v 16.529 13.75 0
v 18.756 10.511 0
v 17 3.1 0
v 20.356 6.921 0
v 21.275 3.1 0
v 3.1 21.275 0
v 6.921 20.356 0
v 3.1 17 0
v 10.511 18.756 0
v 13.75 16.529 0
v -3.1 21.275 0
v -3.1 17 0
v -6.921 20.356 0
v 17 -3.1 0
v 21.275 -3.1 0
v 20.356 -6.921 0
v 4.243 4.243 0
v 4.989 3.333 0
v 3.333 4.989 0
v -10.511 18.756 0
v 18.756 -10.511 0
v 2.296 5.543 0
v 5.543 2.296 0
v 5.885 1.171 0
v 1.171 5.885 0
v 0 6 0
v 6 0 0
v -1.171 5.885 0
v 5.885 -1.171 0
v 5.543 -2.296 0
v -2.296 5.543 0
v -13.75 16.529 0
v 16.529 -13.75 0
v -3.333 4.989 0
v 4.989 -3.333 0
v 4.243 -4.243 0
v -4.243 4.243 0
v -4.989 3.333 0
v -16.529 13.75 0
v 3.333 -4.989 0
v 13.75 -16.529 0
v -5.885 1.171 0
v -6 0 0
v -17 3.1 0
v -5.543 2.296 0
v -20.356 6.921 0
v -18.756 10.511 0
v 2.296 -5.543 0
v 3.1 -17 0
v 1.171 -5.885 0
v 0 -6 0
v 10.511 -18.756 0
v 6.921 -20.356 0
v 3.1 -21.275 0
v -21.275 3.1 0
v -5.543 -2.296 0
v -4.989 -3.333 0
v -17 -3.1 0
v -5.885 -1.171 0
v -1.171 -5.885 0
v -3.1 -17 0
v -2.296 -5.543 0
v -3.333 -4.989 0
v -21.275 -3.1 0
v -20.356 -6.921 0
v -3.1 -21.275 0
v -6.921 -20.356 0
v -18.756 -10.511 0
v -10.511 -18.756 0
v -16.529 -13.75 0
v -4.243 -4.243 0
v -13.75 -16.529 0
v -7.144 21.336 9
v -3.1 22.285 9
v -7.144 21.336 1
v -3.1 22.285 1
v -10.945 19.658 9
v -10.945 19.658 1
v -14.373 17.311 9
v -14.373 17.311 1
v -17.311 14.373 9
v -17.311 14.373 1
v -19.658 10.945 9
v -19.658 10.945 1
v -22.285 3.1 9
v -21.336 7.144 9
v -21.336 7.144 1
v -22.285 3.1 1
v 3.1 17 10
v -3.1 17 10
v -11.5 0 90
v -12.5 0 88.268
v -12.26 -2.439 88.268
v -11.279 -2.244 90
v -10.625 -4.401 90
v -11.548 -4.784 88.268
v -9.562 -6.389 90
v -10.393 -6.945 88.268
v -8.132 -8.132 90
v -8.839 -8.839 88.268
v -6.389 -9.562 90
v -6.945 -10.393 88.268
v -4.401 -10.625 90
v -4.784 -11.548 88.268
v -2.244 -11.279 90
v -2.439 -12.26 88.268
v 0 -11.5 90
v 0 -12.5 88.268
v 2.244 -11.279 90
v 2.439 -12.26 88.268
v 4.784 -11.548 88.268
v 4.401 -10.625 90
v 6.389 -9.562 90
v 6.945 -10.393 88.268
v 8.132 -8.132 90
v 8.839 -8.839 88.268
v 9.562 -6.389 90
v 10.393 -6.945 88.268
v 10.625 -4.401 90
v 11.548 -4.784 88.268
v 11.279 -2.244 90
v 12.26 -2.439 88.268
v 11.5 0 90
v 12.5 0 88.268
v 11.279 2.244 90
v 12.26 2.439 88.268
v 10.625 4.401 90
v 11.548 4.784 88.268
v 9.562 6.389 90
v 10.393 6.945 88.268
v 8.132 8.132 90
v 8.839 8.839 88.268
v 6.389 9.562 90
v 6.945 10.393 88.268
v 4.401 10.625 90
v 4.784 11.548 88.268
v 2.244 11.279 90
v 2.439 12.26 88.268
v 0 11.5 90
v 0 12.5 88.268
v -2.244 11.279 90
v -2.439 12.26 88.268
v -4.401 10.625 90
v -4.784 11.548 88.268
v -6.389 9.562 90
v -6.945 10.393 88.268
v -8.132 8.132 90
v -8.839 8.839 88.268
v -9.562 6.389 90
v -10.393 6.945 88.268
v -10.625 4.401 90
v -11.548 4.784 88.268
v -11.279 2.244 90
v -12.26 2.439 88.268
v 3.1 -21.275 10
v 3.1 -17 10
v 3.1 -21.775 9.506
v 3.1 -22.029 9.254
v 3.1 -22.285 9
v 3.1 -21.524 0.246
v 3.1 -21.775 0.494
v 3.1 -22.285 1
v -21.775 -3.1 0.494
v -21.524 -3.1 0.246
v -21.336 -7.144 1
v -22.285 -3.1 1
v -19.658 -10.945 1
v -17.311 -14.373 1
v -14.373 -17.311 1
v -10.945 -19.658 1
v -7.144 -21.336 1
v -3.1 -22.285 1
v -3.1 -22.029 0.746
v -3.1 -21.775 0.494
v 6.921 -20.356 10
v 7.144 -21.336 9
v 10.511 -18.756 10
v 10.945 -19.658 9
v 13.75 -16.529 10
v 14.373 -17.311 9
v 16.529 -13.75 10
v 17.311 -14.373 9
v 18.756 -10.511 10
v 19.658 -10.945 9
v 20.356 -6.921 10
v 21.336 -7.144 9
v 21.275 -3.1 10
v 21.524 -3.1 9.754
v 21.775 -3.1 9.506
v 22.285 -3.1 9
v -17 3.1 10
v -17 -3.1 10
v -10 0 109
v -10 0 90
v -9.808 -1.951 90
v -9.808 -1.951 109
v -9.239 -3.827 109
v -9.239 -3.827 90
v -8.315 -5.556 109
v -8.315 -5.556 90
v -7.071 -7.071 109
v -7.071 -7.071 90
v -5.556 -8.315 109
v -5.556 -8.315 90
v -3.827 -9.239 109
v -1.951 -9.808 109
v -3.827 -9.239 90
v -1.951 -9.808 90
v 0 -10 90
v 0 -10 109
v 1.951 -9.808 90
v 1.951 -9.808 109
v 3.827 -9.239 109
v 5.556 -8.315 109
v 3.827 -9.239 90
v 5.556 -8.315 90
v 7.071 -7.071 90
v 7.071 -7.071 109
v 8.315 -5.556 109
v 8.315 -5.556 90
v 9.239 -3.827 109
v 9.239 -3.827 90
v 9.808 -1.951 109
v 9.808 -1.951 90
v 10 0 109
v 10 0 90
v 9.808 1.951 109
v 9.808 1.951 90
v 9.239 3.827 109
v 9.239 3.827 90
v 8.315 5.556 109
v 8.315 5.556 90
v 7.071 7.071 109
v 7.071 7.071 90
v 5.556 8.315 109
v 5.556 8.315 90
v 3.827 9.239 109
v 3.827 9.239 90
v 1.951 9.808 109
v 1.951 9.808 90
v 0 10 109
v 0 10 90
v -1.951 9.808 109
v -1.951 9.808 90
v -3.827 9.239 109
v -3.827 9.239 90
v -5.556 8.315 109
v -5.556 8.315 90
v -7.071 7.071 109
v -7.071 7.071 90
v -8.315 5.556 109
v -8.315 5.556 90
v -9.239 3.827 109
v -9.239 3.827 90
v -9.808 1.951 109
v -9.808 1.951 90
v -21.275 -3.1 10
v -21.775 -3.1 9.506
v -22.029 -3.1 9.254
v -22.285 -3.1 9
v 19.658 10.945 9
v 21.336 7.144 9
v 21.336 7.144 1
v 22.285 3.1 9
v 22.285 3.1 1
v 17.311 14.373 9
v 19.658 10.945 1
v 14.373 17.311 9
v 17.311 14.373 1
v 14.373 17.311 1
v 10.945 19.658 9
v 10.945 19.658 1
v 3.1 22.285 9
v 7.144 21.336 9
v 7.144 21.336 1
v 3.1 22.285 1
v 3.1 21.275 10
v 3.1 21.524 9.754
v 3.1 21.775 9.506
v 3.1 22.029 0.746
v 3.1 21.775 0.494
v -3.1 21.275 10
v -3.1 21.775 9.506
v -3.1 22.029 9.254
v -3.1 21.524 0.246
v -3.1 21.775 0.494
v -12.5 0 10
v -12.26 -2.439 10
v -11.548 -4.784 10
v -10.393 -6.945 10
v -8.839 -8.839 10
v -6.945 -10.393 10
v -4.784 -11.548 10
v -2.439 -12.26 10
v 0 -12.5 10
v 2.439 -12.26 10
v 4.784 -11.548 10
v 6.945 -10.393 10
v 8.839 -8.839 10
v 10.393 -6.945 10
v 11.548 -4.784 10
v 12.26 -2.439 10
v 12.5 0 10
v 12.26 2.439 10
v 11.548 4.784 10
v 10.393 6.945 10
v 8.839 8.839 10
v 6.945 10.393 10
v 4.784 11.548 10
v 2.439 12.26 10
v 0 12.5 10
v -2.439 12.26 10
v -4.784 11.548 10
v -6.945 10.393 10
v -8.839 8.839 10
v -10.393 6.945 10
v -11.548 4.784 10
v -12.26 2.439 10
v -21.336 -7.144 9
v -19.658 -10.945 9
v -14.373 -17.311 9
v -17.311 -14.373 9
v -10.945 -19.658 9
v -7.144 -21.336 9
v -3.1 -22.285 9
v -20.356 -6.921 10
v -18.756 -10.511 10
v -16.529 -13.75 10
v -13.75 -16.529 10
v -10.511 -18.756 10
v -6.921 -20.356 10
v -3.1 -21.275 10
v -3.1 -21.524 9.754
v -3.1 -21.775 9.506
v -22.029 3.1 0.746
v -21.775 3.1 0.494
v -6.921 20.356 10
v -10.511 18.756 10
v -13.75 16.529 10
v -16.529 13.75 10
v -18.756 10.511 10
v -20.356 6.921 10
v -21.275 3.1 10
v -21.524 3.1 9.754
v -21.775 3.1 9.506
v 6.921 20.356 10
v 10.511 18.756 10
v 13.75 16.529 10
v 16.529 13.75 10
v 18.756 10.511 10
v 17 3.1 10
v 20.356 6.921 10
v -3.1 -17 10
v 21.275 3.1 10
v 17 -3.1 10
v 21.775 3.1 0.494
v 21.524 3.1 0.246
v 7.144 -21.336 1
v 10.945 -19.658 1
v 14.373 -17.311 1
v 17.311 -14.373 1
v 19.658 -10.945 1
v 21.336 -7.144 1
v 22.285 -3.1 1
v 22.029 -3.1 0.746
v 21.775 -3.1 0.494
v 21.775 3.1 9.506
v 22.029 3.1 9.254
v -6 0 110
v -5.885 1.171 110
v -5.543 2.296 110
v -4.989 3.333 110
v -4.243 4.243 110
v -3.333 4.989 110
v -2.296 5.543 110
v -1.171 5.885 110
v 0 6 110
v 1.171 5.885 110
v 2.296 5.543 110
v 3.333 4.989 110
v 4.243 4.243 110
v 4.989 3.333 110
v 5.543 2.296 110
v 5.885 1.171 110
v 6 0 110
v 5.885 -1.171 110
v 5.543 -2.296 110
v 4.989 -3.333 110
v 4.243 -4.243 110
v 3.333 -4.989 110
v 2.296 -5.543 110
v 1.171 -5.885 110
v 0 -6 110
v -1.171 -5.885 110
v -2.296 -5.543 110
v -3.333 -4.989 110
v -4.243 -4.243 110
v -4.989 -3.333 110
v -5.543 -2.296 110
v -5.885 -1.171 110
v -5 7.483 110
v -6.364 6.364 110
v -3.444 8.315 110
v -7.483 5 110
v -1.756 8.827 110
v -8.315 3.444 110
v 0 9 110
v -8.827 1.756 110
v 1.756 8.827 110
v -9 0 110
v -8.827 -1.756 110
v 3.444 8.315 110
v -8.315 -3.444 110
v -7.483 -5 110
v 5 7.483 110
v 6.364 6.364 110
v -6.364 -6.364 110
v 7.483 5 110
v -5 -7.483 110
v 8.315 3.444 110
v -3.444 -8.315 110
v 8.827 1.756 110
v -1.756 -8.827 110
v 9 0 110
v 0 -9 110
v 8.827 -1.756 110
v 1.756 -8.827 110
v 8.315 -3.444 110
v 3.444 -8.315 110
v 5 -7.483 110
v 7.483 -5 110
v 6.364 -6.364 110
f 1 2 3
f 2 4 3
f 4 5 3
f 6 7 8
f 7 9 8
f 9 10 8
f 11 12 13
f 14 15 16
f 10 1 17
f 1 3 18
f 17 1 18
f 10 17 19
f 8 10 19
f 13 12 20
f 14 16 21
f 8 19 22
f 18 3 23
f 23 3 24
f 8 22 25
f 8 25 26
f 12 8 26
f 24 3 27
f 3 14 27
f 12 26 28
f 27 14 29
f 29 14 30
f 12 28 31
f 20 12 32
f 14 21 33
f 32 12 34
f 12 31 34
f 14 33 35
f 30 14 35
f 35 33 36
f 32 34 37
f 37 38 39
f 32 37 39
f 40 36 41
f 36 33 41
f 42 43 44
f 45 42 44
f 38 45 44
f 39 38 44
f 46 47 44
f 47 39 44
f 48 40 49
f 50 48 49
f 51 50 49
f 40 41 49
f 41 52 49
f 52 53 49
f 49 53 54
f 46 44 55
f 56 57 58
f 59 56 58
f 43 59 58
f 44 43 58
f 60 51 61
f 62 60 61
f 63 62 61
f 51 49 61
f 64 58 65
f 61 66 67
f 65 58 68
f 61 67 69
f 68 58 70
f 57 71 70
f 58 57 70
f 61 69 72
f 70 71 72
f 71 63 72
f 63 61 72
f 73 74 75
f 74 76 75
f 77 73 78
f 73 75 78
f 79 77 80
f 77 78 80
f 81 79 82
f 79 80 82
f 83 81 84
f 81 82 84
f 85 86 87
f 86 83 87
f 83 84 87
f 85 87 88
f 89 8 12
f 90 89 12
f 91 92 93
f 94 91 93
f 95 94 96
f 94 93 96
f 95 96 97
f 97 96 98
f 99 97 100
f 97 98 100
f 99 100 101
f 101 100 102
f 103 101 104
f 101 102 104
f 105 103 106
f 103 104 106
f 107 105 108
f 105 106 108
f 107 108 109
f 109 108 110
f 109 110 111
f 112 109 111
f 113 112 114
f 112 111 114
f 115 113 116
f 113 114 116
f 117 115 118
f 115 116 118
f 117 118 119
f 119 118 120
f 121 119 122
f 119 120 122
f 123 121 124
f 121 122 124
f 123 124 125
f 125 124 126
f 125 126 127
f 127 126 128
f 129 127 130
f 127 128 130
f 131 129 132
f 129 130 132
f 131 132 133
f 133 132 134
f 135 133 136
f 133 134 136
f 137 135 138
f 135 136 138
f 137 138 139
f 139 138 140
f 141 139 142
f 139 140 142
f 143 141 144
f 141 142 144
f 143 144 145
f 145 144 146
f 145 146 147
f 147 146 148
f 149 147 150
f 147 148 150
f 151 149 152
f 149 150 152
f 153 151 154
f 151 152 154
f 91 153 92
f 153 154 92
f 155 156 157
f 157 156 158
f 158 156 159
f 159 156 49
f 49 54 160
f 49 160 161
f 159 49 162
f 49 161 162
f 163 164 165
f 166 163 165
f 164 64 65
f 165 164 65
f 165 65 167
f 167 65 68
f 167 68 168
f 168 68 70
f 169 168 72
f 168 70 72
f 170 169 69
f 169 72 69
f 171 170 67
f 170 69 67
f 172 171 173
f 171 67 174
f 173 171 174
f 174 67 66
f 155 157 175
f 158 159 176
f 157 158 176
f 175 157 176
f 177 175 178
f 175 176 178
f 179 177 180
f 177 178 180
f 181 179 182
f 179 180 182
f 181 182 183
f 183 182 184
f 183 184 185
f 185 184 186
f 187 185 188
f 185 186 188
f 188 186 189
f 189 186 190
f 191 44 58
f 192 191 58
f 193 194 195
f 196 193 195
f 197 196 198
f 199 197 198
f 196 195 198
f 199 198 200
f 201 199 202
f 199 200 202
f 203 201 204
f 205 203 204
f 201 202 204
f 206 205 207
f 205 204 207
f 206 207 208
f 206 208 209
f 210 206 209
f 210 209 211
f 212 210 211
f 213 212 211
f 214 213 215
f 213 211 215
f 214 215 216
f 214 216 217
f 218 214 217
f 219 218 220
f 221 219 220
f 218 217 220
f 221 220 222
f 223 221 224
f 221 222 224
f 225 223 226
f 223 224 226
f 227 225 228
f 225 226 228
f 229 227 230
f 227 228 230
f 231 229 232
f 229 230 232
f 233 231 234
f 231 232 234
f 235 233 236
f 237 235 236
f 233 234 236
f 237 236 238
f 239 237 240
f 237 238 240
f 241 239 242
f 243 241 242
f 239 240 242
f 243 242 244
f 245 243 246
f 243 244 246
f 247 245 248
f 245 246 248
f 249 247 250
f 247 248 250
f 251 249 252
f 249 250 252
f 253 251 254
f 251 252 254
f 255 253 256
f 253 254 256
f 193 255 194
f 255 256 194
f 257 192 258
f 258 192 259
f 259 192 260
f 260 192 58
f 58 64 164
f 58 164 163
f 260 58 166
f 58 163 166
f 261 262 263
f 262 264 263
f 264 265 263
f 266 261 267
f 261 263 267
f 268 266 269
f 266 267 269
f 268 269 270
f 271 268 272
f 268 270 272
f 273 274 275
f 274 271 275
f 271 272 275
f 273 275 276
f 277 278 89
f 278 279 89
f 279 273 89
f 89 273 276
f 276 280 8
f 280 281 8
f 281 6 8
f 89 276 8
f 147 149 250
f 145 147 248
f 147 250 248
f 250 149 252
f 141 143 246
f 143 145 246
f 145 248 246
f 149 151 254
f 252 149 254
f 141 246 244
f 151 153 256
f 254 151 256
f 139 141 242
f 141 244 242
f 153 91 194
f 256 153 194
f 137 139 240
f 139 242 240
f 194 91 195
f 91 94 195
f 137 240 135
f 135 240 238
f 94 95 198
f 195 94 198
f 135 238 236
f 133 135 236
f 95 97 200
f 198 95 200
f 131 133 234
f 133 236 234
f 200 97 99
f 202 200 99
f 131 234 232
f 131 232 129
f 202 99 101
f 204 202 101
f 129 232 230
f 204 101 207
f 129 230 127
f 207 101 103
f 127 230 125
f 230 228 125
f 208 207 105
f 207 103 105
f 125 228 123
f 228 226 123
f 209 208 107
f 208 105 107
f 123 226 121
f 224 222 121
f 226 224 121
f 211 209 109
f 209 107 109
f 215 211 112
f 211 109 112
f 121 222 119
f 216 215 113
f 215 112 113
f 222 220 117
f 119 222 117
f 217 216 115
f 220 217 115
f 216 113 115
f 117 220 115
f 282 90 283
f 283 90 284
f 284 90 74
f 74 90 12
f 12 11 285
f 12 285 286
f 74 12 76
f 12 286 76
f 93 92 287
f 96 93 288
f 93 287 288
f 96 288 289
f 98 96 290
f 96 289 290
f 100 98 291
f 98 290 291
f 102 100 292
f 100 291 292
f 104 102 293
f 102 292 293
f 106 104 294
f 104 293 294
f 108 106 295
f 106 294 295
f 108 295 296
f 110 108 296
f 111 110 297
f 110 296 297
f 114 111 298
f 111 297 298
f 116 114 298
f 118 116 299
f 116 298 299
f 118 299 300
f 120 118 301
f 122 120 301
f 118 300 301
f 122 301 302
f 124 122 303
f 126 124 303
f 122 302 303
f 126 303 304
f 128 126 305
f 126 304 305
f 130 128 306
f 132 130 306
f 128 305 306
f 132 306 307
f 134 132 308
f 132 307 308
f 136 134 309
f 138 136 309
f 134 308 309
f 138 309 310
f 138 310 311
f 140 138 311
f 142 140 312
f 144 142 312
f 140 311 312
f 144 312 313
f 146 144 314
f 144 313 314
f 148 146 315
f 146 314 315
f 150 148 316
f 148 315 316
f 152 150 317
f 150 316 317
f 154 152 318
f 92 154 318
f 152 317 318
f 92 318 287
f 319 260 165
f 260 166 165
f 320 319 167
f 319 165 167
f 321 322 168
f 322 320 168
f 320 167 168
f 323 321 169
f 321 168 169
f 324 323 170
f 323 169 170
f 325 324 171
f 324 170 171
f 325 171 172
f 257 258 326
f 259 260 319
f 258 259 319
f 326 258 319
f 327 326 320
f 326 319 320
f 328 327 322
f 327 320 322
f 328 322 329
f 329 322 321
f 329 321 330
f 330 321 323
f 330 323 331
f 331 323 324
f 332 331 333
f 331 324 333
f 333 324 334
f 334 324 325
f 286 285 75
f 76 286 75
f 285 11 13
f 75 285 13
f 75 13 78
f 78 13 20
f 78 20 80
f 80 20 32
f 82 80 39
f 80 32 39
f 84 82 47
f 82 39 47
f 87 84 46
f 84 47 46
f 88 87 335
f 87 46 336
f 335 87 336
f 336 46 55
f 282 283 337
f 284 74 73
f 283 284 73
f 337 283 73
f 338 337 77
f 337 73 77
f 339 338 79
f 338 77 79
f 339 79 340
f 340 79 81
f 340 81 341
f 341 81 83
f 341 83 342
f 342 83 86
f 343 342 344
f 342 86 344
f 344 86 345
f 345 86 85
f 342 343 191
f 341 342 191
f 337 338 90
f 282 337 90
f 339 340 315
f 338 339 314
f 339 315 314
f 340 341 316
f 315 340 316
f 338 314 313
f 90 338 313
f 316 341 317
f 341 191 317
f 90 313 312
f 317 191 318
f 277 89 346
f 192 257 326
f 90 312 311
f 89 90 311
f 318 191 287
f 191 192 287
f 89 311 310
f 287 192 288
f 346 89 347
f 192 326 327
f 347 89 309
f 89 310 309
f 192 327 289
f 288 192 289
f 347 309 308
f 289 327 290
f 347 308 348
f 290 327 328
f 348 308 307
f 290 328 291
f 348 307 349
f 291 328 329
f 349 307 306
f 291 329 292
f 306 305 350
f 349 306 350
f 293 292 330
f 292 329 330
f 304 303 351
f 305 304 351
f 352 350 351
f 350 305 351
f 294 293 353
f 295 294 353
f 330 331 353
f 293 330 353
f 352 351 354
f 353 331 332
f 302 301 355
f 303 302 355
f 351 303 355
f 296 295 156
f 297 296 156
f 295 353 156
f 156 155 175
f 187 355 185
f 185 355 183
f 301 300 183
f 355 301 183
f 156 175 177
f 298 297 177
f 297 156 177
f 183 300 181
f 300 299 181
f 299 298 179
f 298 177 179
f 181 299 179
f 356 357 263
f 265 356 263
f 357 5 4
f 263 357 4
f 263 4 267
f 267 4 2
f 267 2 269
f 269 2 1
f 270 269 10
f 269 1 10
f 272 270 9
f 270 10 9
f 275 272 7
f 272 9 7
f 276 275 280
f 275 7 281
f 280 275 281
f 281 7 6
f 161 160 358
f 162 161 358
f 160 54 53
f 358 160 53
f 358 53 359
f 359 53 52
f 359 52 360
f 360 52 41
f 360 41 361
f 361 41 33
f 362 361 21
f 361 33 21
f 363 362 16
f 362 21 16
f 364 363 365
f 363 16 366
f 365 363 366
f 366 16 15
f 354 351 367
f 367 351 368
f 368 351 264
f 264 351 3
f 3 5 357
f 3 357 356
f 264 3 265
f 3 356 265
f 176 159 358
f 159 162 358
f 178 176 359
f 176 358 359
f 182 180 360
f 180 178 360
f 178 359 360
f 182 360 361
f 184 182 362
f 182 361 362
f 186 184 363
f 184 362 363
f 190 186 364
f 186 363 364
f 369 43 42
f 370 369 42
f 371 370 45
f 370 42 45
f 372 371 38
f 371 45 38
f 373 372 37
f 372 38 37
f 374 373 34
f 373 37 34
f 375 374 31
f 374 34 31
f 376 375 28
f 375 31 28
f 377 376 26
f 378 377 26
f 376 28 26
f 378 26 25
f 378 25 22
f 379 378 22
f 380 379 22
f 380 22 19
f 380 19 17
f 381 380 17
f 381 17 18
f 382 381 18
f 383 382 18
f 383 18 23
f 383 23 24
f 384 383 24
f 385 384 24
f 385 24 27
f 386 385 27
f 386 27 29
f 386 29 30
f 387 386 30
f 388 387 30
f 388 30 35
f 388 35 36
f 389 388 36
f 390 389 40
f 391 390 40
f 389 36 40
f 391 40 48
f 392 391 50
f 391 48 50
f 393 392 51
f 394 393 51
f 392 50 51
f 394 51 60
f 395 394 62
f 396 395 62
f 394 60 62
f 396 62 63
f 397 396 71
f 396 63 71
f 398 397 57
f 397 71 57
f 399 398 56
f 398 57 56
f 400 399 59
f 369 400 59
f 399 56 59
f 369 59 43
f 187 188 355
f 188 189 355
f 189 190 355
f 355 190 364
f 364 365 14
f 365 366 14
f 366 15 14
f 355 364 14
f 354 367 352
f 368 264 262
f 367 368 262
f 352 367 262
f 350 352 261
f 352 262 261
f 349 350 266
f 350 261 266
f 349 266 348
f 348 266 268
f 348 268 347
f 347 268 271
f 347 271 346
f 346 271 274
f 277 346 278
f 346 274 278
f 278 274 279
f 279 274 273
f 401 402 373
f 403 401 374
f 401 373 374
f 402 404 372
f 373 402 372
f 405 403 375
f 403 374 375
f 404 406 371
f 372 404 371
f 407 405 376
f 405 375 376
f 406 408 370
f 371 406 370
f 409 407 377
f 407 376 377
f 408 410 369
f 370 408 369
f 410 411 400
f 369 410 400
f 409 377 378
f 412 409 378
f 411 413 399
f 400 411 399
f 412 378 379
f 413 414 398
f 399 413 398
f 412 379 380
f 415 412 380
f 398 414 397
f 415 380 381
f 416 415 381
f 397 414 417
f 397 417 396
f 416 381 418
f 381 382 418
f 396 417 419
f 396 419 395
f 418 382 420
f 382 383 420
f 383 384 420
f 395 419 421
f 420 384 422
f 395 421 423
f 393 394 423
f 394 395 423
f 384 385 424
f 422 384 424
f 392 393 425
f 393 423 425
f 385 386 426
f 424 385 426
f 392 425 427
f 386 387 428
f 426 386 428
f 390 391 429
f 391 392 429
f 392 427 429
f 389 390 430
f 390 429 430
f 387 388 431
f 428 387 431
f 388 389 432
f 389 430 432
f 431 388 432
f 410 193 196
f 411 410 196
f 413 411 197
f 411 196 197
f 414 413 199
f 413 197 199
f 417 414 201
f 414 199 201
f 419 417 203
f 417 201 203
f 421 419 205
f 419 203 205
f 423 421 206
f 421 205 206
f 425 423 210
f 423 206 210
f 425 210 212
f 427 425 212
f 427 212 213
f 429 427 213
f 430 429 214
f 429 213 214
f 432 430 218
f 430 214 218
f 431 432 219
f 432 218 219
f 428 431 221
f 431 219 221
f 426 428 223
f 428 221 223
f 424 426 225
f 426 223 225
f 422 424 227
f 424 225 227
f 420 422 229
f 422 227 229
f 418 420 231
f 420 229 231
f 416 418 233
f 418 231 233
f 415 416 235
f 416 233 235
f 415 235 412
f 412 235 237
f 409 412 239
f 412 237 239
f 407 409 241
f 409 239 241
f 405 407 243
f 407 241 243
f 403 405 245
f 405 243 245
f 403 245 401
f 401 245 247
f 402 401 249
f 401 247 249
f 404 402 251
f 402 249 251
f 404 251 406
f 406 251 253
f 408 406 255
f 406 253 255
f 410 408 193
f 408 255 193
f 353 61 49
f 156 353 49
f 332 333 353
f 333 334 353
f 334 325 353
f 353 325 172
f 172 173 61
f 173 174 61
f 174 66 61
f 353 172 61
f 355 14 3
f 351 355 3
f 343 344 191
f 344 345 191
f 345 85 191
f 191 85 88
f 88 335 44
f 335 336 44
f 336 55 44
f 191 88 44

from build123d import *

# Parameters (mm, degrees)
CHANFREIN1_SIZE              = 1
ESQUISSE3_R                  = 6
ENL_V_MAT_EXTRU_2_DEPTH      = 111
ENL_V_MAT_EXTRU_1_DEPTH      = 111
R_P_TITION_CIRCULAIRE1_COUNT = 4
CHANFREIN2_SIZE              = 1
CHANFREIN2_SIZE2             = 1.732050808


with BuildPart() as part:
    # Esquisse1 → Révolution1 (revolve)
    with BuildSketch(Plane(origin=(0, 0, 0), x_dir=(0, 0, -1), z_dir=(1, 0, 0)), mode=Mode.PRIVATE) as r_volution1_sk:
        Polygon((-110, 0), (-110, 10), (-90, 10), (-90, 12.5), (-10, 12.5), (-10, 22.5), (0, 22.5), (0, 0), align=None)
    revolve(r_volution1_sk.sketch.rotate(Axis((0, 0, 0), (0, 0, 1)), 90), axis=Axis((0, 0, 0), (0, 0, 1)))  # turned: the seam where the file's is

    # Chanfrein1
    chanfrein1_edges = [part.edges().sort_by_distance(p)[0] for p in [
        (22.5, 0, 0),
        (22.5, 0, 10),
        (10, 0, 110),
    ]]
    chamfer(chanfrein1_edges, length=CHANFREIN1_SIZE)

    # Esquisse3 → Enlèv. mat.-Extru.2 (cut, through all)
    with BuildSketch(Plane(origin=(0, 0, 0), x_dir=(-1, 0, 0), z_dir=(0, 0, -1))):
        Circle(ESQUISSE3_R)
    extrude(amount=-ENL_V_MAT_EXTRU_2_DEPTH, mode=Mode.SUBTRACT)

    # Esquisse2 → Enlèv. mat.-Extru.1 (cut, through all)
    with BuildSketch(Plane(origin=(0, 0, 0), x_dir=(-1, 0, 0), z_dir=(0, 0, -1))):
        with BuildLine():
            Line((-3.1, 22.285421243), (-3.1, 17))
            Line((-3.1, 17), (3.1, 17))
            Line((3.1, 17), (3.1, 22.285421243))
            ThreePointArc((3.1, 22.285421243), (0, 22.5), (-3.1, 22.285421243))
        make_face()
    enl_v_mat_extru_1 = extrude(amount=-ENL_V_MAT_EXTRU_1_DEPTH, mode=Mode.SUBTRACT)

    # Répétition circulaire1: Enlèv. mat.-Extru.1 ×4 about axis
    r_p_tition_circulaire1_axis = Axis((0, 0, 0), (0, 0, 1))
    for i in range(1, R_P_TITION_CIRCULAIRE1_COUNT):
        add(enl_v_mat_extru_1.rotate(r_p_tition_circulaire1_axis, i * 360 / R_P_TITION_CIRCULAIRE1_COUNT), mode=Mode.SUBTRACT)

    # Chanfrein2
    chanfrein2_edges = [part.edges().sort_by_distance(p)[0] for p in [
        (12.5, 0, 90),
    ]]
    chanfrein2_side = [part.faces().sort_by_distance(p)[0] for p in [
        (10.353553391, 0, 90),
    ]]
    chamfer(chanfrein2_edges, length=CHANFREIN2_SIZE, length2=CHANFREIN2_SIZE2, reference=chanfrein2_side[0])


solid = part.part
